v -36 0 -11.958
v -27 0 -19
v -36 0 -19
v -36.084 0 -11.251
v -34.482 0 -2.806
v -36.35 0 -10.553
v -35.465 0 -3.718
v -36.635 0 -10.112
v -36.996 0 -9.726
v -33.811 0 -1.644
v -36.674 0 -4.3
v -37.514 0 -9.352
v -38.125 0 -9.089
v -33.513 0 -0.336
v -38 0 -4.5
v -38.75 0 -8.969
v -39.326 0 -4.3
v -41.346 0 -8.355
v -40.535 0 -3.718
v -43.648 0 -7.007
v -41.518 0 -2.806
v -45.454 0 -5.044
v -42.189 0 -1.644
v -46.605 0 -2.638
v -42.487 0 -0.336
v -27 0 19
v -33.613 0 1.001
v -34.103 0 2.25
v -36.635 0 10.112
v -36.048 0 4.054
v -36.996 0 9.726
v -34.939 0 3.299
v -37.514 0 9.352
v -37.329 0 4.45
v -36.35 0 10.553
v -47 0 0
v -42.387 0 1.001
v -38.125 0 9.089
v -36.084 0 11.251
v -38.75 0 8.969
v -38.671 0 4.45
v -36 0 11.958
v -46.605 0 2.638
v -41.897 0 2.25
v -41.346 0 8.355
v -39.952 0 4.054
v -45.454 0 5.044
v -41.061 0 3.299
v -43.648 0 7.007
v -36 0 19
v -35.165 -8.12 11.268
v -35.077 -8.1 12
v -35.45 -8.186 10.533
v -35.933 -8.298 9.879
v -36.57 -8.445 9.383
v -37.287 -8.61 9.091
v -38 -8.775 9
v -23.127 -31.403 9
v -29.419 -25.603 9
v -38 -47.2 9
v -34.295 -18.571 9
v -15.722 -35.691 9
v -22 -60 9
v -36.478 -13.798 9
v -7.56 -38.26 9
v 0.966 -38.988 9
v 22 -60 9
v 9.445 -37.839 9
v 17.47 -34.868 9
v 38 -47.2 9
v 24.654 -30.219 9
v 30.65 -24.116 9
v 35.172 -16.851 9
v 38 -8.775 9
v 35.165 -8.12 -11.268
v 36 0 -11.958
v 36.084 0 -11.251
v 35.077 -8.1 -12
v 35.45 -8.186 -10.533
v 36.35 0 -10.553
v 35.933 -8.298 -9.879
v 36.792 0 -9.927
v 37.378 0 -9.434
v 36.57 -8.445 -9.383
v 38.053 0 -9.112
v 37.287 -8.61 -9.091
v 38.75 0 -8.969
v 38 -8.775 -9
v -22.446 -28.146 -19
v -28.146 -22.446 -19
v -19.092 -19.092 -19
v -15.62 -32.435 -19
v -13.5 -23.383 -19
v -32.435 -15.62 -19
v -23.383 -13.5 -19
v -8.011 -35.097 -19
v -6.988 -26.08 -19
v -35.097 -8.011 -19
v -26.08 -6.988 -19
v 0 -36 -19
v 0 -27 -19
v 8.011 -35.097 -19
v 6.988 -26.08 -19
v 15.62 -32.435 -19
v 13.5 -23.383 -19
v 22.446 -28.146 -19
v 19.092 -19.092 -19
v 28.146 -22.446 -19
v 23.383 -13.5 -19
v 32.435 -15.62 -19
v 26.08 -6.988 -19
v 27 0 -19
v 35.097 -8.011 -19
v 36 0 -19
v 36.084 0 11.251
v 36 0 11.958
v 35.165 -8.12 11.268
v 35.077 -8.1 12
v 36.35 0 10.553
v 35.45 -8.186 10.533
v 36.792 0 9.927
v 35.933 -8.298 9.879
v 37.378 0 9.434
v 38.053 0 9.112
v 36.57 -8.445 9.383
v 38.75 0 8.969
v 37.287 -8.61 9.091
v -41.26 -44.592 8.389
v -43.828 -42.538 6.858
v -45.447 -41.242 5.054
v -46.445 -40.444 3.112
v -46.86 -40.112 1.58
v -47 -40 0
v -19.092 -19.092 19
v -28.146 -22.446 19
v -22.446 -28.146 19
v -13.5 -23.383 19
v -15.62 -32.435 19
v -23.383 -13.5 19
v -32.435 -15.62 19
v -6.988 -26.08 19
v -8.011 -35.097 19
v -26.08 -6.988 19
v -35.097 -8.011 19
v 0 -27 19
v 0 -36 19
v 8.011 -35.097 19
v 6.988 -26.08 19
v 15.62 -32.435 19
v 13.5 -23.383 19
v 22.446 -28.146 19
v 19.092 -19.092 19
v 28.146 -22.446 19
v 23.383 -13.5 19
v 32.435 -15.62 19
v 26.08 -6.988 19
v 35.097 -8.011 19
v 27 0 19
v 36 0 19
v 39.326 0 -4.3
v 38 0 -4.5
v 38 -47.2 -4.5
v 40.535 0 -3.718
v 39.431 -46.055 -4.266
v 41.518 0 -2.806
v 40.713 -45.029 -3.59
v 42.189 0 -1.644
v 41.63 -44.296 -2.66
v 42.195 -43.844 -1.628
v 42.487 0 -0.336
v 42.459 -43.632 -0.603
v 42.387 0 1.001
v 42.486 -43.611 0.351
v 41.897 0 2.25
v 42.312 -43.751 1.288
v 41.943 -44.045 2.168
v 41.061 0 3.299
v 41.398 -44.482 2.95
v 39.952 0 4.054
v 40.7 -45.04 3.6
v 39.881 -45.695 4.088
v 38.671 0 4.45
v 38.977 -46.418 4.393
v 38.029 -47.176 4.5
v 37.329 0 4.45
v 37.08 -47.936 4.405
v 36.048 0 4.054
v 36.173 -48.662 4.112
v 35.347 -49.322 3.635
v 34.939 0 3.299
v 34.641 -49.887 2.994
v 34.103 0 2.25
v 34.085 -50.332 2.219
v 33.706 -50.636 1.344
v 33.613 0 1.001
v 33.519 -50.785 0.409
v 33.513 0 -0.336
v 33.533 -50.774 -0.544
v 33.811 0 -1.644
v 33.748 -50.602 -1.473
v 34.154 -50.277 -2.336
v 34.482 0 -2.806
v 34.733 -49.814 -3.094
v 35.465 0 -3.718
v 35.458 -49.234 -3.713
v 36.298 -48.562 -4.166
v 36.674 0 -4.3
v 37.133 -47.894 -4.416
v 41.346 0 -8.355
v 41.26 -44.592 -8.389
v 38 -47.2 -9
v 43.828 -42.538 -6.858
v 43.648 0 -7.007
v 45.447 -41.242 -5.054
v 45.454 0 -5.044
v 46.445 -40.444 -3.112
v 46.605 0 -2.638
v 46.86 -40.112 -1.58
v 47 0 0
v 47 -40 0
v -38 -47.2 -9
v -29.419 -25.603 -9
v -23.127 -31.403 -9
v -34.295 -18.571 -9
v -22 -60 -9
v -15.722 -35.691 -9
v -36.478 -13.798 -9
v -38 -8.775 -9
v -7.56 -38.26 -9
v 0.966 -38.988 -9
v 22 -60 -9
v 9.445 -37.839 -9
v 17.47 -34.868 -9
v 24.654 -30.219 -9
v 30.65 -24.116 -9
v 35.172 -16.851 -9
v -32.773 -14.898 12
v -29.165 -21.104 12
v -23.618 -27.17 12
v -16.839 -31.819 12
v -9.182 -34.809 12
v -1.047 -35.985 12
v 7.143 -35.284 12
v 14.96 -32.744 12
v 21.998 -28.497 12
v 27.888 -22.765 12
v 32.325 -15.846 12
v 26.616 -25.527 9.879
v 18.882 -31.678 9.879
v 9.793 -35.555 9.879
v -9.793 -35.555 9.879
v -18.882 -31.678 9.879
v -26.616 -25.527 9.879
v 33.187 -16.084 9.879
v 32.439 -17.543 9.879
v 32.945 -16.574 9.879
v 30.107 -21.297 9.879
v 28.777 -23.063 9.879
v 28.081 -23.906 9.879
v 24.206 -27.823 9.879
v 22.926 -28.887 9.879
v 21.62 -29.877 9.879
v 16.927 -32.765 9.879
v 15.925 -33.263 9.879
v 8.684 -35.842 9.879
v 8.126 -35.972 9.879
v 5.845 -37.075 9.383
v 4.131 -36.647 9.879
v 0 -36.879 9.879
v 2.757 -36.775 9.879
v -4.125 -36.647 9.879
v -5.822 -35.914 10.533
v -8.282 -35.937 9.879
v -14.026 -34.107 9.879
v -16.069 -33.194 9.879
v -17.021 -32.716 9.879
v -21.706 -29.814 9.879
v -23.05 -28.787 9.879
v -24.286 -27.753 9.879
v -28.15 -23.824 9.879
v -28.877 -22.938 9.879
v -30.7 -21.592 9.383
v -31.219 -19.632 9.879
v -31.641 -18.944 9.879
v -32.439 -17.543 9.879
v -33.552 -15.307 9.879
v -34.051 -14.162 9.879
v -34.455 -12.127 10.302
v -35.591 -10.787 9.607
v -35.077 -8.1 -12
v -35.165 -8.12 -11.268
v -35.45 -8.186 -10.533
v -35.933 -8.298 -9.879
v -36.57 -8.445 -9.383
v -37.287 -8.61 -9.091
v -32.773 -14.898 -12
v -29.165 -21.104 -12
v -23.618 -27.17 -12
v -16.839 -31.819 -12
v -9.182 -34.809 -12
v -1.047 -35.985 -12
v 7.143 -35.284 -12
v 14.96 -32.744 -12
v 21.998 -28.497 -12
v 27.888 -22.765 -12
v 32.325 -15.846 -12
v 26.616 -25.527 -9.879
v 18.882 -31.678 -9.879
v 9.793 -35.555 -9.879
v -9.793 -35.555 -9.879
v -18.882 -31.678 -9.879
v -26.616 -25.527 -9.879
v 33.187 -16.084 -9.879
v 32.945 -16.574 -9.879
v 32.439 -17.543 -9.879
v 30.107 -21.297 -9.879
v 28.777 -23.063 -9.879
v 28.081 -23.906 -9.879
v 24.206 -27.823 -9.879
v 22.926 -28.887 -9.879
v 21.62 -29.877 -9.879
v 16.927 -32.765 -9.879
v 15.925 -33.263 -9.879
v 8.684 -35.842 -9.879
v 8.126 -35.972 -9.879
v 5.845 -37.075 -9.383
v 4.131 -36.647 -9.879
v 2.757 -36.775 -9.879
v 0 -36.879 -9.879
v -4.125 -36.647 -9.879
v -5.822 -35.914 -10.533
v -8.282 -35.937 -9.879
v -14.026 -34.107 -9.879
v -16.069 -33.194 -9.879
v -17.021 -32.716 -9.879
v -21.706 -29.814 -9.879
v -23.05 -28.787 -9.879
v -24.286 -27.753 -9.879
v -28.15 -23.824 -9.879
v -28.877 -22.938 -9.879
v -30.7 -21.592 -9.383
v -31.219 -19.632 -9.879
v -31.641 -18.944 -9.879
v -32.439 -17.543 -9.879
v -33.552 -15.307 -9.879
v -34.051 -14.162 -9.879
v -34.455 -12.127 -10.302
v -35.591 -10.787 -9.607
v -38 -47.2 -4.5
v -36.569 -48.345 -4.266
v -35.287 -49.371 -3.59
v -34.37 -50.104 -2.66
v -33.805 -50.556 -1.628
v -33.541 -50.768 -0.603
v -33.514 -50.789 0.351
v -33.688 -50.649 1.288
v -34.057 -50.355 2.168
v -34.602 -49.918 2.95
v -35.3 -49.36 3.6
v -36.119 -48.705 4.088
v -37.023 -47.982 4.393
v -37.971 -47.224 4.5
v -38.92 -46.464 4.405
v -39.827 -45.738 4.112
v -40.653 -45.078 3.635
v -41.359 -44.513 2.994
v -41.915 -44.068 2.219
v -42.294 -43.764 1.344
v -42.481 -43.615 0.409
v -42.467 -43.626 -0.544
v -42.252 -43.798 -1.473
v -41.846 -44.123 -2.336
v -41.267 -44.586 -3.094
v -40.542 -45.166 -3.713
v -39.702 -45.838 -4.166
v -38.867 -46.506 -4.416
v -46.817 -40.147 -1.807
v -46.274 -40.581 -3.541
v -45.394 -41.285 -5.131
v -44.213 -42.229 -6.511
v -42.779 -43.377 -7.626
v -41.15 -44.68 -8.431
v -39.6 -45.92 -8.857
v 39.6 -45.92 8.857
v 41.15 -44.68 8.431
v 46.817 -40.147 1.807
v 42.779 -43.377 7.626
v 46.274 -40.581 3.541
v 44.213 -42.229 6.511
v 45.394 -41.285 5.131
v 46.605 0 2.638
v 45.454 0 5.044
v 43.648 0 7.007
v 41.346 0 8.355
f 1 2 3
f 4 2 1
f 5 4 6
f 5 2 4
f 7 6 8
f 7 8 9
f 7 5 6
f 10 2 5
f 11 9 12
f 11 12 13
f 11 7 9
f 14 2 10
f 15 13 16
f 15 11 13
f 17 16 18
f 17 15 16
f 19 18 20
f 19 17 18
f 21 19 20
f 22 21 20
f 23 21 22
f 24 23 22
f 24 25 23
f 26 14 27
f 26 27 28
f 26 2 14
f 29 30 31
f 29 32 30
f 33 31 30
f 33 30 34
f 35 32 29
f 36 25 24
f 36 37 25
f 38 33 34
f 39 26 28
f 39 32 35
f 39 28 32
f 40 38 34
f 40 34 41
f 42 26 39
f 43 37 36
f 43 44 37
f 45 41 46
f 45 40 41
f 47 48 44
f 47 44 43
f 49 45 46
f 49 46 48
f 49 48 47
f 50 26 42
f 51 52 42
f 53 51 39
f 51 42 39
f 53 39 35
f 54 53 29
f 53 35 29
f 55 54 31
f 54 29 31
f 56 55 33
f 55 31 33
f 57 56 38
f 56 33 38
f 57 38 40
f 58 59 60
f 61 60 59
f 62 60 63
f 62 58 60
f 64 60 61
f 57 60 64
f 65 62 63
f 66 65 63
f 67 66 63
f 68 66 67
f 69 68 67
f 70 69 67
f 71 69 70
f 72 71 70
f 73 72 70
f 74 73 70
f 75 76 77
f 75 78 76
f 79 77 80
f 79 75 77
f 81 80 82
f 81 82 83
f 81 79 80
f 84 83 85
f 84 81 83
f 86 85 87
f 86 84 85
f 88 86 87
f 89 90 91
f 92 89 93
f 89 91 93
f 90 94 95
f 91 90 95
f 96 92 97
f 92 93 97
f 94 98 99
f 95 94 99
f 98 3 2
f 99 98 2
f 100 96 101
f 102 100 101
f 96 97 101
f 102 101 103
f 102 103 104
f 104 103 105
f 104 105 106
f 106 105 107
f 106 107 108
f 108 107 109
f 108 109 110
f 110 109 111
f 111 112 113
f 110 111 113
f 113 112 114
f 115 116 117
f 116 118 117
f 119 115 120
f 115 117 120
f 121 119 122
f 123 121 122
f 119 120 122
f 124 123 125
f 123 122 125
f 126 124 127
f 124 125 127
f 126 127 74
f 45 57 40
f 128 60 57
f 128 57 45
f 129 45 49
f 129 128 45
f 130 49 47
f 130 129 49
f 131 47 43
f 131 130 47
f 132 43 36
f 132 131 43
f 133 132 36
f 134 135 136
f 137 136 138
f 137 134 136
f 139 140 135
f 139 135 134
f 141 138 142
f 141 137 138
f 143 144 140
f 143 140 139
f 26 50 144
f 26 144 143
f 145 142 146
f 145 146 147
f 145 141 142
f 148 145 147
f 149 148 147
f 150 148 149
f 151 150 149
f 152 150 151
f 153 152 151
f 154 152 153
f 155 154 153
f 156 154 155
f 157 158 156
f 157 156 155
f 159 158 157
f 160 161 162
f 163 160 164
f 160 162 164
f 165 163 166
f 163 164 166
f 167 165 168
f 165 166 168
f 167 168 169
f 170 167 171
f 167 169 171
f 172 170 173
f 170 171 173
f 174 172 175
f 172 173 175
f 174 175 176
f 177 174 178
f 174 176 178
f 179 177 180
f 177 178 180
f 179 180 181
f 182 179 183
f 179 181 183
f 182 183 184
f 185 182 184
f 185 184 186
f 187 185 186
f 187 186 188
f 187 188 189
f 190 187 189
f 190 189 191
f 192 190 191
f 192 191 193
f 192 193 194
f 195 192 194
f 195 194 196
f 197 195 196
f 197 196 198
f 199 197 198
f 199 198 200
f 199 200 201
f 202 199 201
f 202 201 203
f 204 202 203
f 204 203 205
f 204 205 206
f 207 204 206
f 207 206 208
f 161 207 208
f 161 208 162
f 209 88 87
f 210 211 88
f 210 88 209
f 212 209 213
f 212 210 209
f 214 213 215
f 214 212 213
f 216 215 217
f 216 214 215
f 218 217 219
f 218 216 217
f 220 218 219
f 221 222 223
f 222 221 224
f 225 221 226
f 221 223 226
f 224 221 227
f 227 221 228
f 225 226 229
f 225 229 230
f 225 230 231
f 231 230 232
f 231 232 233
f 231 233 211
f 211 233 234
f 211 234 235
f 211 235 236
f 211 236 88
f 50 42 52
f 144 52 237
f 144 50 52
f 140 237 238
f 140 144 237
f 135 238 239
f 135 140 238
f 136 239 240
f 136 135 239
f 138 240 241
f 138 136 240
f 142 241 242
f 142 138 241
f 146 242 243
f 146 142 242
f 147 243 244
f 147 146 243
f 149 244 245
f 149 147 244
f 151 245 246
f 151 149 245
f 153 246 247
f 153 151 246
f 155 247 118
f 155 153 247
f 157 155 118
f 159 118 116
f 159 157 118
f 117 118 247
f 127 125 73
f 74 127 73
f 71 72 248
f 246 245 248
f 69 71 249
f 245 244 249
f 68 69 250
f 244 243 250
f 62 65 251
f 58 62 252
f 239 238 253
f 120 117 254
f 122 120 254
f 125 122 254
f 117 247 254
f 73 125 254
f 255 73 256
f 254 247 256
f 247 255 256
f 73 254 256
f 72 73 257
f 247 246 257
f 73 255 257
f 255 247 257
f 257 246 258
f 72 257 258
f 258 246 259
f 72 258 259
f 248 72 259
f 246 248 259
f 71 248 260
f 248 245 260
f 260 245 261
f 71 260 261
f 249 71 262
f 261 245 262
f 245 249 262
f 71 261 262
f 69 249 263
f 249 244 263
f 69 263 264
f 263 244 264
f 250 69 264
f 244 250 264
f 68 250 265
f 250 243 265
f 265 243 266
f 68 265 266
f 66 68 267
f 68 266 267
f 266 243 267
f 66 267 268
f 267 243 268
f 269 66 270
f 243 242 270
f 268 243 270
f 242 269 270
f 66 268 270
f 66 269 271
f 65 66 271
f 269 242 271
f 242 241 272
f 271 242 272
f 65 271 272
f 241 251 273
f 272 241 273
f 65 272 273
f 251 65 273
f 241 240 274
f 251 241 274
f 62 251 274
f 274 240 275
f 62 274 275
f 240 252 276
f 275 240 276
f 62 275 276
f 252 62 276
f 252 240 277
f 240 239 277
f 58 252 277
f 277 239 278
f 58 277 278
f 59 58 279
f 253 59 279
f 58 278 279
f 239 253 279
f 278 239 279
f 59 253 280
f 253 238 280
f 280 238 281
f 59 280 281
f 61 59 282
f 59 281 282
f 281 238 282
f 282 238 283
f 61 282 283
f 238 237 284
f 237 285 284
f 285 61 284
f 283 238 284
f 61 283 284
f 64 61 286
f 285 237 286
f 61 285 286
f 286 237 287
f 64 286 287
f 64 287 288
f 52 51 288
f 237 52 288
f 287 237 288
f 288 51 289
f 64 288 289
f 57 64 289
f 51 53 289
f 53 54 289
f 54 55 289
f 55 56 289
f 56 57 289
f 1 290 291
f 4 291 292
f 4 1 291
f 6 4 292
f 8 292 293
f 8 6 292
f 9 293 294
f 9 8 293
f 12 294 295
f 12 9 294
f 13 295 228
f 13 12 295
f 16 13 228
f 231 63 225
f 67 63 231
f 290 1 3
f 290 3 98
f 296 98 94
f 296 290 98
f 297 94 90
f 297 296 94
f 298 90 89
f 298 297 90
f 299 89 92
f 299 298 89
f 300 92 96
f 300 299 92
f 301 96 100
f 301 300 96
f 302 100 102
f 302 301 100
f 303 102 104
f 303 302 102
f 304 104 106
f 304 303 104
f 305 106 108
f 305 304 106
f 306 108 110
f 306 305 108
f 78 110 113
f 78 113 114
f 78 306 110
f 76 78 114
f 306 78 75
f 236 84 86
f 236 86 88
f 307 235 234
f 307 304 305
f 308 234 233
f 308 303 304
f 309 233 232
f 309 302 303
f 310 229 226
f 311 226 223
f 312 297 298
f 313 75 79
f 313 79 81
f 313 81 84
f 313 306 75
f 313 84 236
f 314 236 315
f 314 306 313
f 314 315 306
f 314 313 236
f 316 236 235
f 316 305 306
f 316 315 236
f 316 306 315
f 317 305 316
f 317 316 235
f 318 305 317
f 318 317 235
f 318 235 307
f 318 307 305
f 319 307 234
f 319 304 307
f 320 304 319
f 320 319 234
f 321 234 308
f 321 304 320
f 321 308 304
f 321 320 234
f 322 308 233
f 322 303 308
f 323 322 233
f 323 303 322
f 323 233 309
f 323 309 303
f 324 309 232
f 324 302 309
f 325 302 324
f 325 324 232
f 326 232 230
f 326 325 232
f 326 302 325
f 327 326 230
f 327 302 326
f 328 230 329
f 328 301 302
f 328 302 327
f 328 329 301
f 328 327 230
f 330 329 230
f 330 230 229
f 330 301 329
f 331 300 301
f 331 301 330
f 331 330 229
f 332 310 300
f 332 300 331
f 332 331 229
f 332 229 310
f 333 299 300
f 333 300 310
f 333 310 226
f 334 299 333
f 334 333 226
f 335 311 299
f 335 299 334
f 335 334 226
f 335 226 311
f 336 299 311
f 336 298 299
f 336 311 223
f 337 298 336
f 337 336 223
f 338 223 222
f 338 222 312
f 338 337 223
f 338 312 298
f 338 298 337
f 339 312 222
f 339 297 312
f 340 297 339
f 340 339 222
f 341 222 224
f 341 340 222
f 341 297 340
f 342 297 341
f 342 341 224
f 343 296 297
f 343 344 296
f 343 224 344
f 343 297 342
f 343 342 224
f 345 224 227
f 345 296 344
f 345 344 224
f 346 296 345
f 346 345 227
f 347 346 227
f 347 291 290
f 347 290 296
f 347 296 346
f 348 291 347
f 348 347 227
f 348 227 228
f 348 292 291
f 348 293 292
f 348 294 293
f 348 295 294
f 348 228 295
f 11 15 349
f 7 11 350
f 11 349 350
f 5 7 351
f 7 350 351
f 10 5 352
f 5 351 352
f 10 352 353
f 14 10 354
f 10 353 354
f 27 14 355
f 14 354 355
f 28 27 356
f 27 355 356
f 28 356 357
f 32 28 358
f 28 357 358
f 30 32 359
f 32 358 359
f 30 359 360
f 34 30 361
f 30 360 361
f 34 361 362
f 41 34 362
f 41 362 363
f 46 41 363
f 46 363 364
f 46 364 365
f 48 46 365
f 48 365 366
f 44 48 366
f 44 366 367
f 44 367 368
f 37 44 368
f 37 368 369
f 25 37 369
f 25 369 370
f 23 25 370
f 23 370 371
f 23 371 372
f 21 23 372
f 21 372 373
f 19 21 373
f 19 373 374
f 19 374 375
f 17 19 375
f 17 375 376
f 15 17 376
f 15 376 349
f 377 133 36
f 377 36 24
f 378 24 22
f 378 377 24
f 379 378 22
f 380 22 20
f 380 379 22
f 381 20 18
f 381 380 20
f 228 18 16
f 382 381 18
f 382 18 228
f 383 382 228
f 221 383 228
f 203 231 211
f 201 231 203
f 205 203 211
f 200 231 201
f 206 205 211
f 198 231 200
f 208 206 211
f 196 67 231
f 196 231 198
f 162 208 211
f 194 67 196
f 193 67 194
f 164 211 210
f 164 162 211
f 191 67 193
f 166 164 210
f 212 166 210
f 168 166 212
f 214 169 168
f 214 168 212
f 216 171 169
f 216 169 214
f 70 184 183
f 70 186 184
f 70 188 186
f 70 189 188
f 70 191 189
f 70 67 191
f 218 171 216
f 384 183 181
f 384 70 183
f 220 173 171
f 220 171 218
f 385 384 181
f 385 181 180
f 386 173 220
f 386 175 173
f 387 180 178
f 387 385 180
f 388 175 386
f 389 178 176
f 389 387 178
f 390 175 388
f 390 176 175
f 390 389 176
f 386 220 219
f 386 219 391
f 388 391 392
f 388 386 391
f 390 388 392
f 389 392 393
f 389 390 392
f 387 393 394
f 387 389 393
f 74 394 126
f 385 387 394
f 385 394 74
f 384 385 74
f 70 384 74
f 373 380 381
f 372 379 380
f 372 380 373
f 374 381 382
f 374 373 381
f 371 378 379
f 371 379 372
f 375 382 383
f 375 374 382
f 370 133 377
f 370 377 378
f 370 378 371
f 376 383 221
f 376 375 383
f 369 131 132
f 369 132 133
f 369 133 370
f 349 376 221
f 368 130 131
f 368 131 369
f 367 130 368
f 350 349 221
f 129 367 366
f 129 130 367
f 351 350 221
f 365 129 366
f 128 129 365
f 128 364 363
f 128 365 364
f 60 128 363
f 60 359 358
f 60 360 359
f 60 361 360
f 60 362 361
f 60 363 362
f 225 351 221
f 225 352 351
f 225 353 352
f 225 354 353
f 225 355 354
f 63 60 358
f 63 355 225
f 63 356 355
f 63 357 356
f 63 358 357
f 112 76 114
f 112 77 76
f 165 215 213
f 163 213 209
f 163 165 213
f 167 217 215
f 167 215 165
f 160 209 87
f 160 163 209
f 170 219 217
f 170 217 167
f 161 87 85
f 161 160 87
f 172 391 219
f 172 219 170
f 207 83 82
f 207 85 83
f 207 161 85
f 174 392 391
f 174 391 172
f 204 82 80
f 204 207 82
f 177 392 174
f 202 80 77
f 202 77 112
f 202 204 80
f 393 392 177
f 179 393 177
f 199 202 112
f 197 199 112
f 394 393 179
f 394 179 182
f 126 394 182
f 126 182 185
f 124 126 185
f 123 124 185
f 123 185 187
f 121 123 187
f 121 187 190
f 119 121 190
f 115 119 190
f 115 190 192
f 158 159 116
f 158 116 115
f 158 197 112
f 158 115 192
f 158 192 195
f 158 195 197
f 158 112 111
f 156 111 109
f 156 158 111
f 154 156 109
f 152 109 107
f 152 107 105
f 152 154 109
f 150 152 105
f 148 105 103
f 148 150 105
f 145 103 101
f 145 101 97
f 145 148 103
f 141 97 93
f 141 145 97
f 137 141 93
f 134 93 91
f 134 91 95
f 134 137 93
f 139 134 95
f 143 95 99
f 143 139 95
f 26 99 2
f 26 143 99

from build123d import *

# Parameters (mm, degrees)
BOSS_EXTRUDE1_DEPTH    = 19
BOSS_EXTRUDE2_DEPTH    = 9
FILLET1_START          = -60
FILLET1_DEPTH          = 60
FILLET2_START          = -60
FILLET2_DEPTH          = 60
M10X1_5_TAPPED_HOLE1_D = 9
FILLET3_R              = 3


with BuildPart() as part:
    # Sketch1 → Boss-Extrude1 (new, symmetric)
    with BuildSketch(Plane.XY):
        with BuildLine():
            Line((-27, 0), (-36, 0))
            ThreePointArc((-36, 0), (0, -36), (36, 0))
            Line((36, 0), (27, 0))
            ThreePointArc((27, 0), (0, -27), (-27, 0))
        make_face()
    extrude(amount=BOSS_EXTRUDE1_DEPTH, both=True)

    # Sketch1<3> → Boss-Extrude2 (add, symmetric)
    with BuildSketch(Plane.XY):
        with BuildLine():
            Line((-36, 0), (-47, 0))
            Line((-47, 0), (-47, -40))
            Line((-47, -40), (-22, -60))
            Line((-22, -60), (22, -60))
            Line((22, -60), (47, -40))
            Line((47, -40), (47, 0))
            Line((47, 0), (36, 0))
            ThreePointArc((36, 0), (0, -36), (-36, 0))
        make_face()
    extrude(amount=BOSS_EXTRUDE2_DEPTH, both=True)

    # Fillet1: read off the stored shape, not the designer's step
    # Fillet1 outline → Fillet1 (cut)
    with BuildSketch(Plane(origin=(0, 0, 0), x_dir=(1, 0, 0), z_dir=(0, 1, 0)).offset(FILLET1_START)):
        with BuildLine():
            Line((47, 9), (38, 9))
            ThreePointArc((38, 9), (44.363961031, 6.363961031), (47, 0))
            Line((47, 0), (47, 9))
        make_face()
        with BuildLine():
            Line((47, -9), (47, 0))
            ThreePointArc((47, 0), (44.363961031, -6.363961031), (38, -9))
            Line((38, -9), (47, -9))
        make_face()
    extrude(amount=FILLET1_DEPTH, mode=Mode.SUBTRACT)

    # Fillet2: read off the stored shape, not the designer's step
    # Fillet2 outline → Fillet2 (cut)
    with BuildSketch(Plane(origin=(0, 0, 0), x_dir=(1, 0, 0), z_dir=(0, 1, 0)).offset(FILLET2_START)):
        with BuildLine():
            Line((-47, -9), (-38, -9))
            ThreePointArc((-38, -9), (-44.363961031, -6.363961031), (-47, 0))
            Line((-47, 0), (-47, -9))
        make_face()
        with BuildLine():
            Line((-47, 9), (-47, 0))
            ThreePointArc((-47, 0), (-44.363961031, 6.363961031), (-38, 9))
            Line((-38, 9), (-47, 9))
        make_face()
    extrude(amount=FILLET2_DEPTH, mode=Mode.SUBTRACT)

    # M10x1.5 Tapped Hole1 (through all)
    with Locations(Plane(origin=(-38, 0, 0), x_dir=(0, 0, 1), z_dir=(0, 1, 0))):
        with Locations((0, 0), (0, 76)):
            Hole(M10X1_5_TAPPED_HOLE1_D / 2)

    # Fillet3
    fillet3_edges = [part.edges().sort_by_distance(p)[0] for p in [
        (0, -36, -9),
        (0, -36, 9),
    ]]
    fillet(fillet3_edges, radius=FILLET3_R)


solid = part.part
